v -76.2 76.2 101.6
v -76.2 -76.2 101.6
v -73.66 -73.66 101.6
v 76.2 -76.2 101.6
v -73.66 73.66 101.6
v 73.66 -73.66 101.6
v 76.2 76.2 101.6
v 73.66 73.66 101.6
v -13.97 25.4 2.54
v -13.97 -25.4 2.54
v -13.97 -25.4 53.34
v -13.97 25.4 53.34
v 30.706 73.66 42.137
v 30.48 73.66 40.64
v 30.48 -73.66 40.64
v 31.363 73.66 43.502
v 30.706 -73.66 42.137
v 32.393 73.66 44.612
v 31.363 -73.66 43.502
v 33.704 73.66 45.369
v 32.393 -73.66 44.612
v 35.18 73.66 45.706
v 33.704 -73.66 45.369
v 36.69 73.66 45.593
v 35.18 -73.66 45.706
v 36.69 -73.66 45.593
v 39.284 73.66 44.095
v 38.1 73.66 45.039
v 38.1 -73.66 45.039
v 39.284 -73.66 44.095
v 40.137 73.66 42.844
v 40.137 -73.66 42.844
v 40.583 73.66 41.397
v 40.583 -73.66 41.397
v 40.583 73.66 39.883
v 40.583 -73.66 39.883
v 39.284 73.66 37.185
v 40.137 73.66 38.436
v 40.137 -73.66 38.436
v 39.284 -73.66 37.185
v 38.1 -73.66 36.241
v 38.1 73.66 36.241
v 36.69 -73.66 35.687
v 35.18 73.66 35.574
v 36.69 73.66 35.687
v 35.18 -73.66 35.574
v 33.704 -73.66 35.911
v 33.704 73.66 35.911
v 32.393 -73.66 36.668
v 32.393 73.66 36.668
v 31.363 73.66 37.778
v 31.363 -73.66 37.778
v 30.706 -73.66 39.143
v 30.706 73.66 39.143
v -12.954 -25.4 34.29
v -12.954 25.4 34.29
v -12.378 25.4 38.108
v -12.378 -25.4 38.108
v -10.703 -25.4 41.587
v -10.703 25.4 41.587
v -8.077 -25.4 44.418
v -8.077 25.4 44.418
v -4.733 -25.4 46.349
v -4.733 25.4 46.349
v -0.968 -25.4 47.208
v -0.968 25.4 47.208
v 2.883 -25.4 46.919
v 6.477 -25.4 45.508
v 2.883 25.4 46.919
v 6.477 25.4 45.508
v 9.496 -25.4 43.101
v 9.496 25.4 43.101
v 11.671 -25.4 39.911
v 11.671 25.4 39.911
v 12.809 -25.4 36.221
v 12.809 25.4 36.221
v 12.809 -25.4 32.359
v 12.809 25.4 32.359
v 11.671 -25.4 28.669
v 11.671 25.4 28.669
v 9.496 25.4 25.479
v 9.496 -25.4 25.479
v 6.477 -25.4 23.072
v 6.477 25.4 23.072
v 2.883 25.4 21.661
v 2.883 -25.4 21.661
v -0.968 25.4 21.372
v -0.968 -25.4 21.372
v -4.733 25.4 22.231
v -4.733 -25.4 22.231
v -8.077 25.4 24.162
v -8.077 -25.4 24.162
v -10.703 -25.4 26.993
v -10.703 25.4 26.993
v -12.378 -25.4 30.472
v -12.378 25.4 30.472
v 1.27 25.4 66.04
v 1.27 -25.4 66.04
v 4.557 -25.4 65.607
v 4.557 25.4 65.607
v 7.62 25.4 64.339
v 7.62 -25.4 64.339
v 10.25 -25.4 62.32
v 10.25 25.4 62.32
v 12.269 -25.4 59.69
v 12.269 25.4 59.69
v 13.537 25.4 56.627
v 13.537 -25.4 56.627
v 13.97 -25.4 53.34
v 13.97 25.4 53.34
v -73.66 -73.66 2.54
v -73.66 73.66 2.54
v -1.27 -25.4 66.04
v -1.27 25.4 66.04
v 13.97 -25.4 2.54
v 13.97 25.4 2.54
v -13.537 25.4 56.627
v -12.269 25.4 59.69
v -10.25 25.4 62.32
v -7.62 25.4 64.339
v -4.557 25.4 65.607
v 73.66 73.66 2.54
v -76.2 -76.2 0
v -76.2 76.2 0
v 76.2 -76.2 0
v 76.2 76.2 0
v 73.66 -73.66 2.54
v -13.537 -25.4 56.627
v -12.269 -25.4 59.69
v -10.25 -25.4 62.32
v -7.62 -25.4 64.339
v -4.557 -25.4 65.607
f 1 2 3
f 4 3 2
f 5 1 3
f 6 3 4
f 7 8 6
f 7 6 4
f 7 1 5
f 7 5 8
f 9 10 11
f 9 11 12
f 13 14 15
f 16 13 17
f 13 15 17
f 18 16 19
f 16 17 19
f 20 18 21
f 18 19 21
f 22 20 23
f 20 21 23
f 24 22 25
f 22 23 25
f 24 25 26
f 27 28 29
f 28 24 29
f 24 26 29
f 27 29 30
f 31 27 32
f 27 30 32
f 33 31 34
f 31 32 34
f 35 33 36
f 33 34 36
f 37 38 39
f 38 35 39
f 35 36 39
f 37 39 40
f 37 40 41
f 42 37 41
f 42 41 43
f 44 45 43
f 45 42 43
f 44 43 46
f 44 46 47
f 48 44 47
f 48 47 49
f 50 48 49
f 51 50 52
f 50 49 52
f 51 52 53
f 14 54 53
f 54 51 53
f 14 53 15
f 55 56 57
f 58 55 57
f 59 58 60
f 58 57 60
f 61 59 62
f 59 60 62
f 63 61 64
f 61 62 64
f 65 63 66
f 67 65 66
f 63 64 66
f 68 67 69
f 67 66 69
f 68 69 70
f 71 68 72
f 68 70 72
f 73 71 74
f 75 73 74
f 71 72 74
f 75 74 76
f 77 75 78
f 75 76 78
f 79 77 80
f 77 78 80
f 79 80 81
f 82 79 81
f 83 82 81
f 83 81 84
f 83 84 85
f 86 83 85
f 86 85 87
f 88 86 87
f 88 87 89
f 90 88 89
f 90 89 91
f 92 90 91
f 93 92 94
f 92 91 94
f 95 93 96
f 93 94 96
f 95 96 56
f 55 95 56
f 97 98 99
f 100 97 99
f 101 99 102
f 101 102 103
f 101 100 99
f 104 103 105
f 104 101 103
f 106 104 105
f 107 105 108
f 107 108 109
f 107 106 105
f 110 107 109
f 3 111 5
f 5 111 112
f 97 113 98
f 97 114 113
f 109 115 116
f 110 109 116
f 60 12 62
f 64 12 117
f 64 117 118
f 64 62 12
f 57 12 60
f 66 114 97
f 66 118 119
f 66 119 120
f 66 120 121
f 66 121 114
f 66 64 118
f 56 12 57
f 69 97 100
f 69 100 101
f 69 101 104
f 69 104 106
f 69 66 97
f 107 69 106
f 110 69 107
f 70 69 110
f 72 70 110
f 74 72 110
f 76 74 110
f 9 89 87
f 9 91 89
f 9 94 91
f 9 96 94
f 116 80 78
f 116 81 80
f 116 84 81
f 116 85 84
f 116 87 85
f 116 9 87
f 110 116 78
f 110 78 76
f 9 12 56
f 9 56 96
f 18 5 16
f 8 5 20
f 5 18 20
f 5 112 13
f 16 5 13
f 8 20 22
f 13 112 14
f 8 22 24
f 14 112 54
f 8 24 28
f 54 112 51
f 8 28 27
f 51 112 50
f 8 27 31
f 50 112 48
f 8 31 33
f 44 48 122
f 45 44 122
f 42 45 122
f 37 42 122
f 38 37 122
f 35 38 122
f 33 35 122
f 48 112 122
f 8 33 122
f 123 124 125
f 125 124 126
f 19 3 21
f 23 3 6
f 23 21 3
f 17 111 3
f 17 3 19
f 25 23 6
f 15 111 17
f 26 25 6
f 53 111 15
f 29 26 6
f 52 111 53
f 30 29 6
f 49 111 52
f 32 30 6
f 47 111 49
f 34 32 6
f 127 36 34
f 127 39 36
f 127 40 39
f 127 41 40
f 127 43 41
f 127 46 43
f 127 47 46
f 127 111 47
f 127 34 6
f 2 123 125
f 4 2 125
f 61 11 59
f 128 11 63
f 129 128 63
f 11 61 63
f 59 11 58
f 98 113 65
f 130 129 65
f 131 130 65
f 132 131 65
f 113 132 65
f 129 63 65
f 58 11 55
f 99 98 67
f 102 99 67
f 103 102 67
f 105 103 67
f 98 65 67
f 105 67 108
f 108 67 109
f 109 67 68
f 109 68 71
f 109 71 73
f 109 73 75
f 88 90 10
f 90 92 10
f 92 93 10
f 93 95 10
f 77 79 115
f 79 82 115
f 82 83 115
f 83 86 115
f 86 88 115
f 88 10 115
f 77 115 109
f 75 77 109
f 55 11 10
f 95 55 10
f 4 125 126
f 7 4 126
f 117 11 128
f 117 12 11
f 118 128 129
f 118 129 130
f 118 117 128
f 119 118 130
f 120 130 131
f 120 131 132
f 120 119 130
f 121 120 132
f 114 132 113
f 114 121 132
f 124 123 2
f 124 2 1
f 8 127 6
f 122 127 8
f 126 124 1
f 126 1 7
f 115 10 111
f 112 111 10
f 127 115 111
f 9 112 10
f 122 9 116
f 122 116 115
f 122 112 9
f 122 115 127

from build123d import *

# Parameters (mm, degrees)
F0_W     = 152.4
F0_H     = 152.4
F1_DEPTH = 101.6
F2_T     = -2.54
F3_R     = 5.08
F4_DEPTH = 149.86
F5_W     = 27.94
F5_H     = 50.8
F6_DEPTH = 63.5
F7_R     = 12.954
F8_DEPTH = 50.8
F9_R     = 12.7
F10_R    = 12.7


with BuildPart() as f1:
    # F0 (on Top) → F1 (new body)
    with BuildSketch(Plane.XY):
        Rectangle(F0_W, F0_H)
    extrude(amount=F1_DEPTH)

    # F2
    f2_openings = [f1.faces().sort_by_distance(p)[0] for p in [
        (0, 0, 101.6),
    ]]
    offset(amount=F2_T, openings=f2_openings)

    # F3 (on face) → F4 (join)
    with BuildSketch(Plane(origin=(0, -73.66, 0), x_dir=(-1, 0, 0), z_dir=(0, 1, 0))):
        with Locations((-35.56, 40.64)):
            Circle(F3_R)
    extrude(amount=F4_DEPTH)

    # F5 (on face) → F6 (join)
    with BuildSketch(Plane.XY.offset(2.54)):
        Rectangle(F5_W, F5_H)
    extrude(amount=F6_DEPTH)

    # F7 (on face) → F8 (cut)
    with BuildSketch(Plane(origin=(0, 25.4, 0), x_dir=(-1, 0, 0), z_dir=(0, 1, 0))):
        with Locations((0, 34.29)):
            Circle(F7_R)
    extrude(amount=-F8_DEPTH, mode=Mode.SUBTRACT)

    # F9
    f9_edges = [f1.edges().sort_by_distance(p)[0] for p in [
        (-13.97, 0, 66.04),
    ]]
    fillet(f9_edges, radius=F9_R)

    # F10
    f10_edges = [f1.edges().sort_by_distance(p)[0] for p in [
        (13.97, 0, 66.04),
    ]]
    fillet(f10_edges, radius=F10_R)


solid = f1.part
